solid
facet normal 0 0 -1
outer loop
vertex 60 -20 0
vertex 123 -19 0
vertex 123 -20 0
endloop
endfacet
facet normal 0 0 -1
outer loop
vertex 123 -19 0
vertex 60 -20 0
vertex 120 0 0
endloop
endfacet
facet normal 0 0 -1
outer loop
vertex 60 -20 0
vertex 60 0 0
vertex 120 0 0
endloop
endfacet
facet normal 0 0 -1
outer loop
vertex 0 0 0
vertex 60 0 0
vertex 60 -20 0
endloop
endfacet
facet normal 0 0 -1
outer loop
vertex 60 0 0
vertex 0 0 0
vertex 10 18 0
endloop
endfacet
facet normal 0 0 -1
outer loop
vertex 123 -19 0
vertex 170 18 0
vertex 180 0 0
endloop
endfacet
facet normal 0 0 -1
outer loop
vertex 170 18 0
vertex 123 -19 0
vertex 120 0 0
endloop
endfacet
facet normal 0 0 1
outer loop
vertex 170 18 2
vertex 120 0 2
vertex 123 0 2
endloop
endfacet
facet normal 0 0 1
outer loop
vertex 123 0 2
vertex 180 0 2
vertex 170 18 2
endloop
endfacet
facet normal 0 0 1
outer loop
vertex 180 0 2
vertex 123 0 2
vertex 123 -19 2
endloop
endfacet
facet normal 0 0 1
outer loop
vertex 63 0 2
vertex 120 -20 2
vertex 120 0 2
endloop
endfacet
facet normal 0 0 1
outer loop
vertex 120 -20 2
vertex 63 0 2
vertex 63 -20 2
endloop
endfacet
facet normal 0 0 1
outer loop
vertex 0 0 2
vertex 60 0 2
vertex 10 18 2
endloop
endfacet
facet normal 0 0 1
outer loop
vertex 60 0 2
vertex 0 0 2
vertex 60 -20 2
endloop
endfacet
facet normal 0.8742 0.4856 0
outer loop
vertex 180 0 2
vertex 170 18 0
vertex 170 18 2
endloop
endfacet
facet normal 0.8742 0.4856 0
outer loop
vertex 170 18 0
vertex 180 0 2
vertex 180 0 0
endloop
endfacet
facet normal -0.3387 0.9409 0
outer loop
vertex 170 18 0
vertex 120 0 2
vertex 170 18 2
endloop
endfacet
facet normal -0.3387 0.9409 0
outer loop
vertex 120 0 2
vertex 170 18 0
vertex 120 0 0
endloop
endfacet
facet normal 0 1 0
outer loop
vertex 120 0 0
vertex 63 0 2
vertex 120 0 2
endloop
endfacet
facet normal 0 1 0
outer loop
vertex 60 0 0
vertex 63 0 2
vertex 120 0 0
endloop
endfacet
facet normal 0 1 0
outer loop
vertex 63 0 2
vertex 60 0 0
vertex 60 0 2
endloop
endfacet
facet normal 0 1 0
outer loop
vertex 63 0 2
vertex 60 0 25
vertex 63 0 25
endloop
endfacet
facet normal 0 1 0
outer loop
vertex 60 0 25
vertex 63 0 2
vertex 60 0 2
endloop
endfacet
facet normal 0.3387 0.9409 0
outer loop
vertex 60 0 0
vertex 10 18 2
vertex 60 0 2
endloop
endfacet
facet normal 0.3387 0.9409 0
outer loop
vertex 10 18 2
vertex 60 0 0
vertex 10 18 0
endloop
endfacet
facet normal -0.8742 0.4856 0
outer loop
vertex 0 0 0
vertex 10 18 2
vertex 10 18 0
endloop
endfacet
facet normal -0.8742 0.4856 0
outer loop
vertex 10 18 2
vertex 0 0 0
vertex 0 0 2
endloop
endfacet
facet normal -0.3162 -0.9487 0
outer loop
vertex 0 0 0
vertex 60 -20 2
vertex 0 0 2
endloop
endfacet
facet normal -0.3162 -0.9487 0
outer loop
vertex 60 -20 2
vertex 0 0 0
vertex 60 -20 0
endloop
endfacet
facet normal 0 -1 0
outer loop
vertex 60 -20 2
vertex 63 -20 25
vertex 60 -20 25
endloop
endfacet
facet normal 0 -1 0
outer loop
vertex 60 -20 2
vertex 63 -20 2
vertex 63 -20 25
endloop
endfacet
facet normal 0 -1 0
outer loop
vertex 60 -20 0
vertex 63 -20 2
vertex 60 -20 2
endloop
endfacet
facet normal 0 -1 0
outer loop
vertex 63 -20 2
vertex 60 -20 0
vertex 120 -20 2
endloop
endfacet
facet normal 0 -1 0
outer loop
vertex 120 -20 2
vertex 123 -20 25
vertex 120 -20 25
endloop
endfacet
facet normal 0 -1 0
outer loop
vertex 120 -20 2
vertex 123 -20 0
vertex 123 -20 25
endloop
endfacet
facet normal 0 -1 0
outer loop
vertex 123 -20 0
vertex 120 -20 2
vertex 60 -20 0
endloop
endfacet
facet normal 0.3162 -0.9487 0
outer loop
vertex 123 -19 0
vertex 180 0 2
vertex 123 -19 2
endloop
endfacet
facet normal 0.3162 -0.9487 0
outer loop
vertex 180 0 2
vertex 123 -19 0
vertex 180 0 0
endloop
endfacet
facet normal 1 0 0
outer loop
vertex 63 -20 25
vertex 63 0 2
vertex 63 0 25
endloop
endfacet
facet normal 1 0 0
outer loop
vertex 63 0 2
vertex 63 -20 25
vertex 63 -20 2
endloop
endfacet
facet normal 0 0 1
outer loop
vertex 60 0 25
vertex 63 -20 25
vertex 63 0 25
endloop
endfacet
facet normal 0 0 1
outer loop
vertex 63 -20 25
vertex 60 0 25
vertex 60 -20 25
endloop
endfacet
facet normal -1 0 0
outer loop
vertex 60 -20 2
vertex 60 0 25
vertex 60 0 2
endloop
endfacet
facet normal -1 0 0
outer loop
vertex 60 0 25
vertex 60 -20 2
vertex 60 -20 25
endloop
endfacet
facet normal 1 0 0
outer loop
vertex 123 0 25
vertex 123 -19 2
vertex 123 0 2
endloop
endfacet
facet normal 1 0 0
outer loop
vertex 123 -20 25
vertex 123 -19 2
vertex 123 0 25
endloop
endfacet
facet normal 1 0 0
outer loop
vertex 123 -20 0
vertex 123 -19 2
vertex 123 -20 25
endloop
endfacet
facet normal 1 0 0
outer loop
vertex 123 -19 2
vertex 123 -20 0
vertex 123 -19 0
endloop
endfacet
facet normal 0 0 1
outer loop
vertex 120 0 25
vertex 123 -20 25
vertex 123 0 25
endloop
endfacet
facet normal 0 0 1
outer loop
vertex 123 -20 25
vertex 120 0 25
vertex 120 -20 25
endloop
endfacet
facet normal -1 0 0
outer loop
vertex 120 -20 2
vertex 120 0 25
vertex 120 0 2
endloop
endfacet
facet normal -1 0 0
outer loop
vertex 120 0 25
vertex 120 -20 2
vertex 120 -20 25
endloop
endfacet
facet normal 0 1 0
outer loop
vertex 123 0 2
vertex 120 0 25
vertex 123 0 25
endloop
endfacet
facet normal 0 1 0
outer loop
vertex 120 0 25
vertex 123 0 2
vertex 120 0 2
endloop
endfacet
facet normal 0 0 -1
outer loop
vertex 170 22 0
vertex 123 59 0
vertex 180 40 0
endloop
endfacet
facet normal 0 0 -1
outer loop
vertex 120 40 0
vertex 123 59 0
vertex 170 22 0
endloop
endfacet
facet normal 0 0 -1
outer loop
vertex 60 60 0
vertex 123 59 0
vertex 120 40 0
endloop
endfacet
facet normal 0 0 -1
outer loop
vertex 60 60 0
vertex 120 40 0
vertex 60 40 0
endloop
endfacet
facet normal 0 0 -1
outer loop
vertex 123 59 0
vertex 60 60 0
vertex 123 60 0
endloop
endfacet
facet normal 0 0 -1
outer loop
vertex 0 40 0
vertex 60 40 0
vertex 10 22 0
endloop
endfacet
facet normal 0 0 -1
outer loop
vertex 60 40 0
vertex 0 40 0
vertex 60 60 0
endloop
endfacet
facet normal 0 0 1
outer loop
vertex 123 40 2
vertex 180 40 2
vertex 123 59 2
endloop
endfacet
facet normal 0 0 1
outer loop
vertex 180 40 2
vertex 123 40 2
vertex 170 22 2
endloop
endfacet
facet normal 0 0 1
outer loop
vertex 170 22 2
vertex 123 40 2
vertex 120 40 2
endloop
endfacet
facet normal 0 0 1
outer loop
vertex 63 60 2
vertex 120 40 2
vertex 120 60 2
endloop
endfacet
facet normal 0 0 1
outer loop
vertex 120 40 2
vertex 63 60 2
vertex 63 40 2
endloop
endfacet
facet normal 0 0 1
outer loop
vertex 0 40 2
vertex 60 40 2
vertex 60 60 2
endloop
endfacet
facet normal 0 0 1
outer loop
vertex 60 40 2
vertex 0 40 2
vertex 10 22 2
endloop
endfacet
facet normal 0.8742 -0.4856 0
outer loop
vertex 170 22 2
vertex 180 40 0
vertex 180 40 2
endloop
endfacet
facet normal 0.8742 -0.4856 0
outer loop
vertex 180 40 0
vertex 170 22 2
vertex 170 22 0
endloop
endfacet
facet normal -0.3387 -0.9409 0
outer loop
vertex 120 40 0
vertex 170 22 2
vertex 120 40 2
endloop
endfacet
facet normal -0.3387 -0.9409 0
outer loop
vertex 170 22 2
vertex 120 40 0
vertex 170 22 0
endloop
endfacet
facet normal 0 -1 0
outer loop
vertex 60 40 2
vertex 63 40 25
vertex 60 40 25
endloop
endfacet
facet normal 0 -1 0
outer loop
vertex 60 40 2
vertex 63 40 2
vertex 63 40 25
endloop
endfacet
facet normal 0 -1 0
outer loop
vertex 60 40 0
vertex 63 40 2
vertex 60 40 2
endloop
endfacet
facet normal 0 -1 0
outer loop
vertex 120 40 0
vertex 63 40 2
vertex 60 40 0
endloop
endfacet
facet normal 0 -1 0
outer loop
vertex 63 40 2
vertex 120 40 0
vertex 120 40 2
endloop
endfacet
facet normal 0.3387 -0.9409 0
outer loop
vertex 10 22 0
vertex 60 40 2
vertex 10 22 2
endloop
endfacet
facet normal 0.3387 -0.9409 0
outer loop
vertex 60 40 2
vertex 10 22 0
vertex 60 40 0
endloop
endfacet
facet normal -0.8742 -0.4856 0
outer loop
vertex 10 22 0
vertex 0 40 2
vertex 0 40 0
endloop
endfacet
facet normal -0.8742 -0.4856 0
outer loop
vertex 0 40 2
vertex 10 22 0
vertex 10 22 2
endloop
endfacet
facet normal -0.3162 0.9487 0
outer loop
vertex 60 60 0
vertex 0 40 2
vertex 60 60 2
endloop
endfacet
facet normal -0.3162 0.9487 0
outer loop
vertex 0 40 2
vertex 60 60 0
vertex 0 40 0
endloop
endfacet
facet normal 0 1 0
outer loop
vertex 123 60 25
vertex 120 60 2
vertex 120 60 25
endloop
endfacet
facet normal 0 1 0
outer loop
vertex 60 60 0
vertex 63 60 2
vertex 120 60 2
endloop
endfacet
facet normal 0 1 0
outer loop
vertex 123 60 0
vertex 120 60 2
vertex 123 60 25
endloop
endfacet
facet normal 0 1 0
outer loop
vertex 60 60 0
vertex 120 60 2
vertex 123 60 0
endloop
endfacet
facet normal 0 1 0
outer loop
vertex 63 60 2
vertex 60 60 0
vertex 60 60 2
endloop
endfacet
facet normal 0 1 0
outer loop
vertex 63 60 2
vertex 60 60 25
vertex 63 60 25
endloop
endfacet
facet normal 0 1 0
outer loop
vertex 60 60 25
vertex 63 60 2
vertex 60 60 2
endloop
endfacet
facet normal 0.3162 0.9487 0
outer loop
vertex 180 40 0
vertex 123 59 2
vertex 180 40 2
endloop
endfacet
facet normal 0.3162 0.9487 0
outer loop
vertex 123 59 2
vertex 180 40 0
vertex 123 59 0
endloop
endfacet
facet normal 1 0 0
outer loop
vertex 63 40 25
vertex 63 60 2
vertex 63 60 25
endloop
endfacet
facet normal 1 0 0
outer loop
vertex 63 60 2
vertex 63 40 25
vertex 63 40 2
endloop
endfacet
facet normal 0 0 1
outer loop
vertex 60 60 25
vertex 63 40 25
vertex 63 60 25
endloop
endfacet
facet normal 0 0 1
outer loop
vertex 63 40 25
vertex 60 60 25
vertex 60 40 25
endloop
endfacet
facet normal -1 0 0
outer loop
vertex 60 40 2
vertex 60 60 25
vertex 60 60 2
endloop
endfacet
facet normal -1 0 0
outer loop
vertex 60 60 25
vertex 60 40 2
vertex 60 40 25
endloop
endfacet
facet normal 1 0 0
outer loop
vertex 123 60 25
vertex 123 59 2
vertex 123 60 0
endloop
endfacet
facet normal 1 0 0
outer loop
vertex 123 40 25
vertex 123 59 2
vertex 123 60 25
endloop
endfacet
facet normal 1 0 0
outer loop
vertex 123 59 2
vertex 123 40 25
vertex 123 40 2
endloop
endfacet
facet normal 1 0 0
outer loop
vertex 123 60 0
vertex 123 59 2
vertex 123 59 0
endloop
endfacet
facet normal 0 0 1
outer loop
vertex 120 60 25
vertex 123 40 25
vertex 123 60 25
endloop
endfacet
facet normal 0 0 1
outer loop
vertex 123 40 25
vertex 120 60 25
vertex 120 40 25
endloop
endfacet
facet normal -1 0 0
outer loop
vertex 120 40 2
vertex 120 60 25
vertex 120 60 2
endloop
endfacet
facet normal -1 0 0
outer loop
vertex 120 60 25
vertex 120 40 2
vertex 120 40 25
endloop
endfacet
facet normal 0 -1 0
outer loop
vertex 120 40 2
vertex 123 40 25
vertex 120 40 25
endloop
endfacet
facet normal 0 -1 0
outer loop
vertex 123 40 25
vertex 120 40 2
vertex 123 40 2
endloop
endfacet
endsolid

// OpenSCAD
//servo_with_2holders();
//leg_with_servo();
//servo_holder1();
//servo_holder1_1();
//servo_holder();

//2servo_holders_for_printing();
//2servo_holders1_for_printing();
//2servo_holders1_1_for_printing();
//2legs_for_printing();

//4servo_holders_for_printing();
//4servo_holders1_for_printing();

//scale(v=[.3,.3,.3]) full_model();
body();
translate([0,40,0]) mirror([0,1,0]) body();


module full_leg() {
    translate ([80, 0, 0]) rotate(a=180, v=[0,0,1]) {
        rotate(a=45, v=[0,1,0]) 2servo_holders_for_printing();
        translate([-20, 8, 50]) rotate(a=120, v=[0,1,0]) leg_with_servo();
        translate([0, 6, -25]) servo_with_holder1();
        translate([81, 12, -32]) rotate(a=90, v=[1,0,0]) rotate(a=180, v=[0,1,0]) servo_with_holder1();    
    }
}

module full_model() {
    module right_half() {
        translate([10,-50, -40]) rotate (a=90, v=[0,0,1]) body();
        translate([10,130, 0]) rotate (a=180, v=[0,1,0]) rotate (a=270, v=[0,0,1]) body();
        // 3 legs
        translate([-10, 0, 0]) rotate (a=-30, v=[0,0,1]) full_leg();
        translate([0, 60, 0]) full_leg(); 
        translate([-20, 120, 0]) rotate (a=30, v=[0,0,1]) full_leg();
    }

    right_half();
    translate([-60,0,0]) mirror([1,0,0]) right_half();
}

module 4servo_holders_for_printing() {
    2servo_holders_for_printing();
    translate ([0, 42, 0]) 2servo_holders_for_printing();
}

module 4servo_holders1_for_printing() {
    2servo_holders1_for_printing();
    translate ([0, 32, 0]) 2servo_holders1_for_printing();
}

module 2servo_holders_for_printing() {
    // 2 servo holders for printing
    translate ([0, 0, 14]) rotate(a=90, v=[0,1,0]) servo_holder();
    rotate(a=270, v=[0,1,0]) servo_holder();
}

module 2servo_holders1_for_printing() {
    // 2 servo holders for printing
    translate ([-42, 0, 0]) servo_holder1();
    servo_holder1();
}

module 2servo_holders1_1_for_printing() {
    // 2 servo holders for printing
    translate ([-42, 0, 0]) servo_holder1_1();
    servo_holder1_1();

    translate([-1, 0, 0]) cube([4, 0.5, 14]);
}

module 2legs_for_printing() {
    // 2 legs for printing
    translate ([0, 0, 3]) rotate (a= 90, v=[1,0,0]) leg();
    translate ([0, 4, 0]) rotate (a= 270, v=[1,0,0]) leg();

    cube([0.5, 4, 3]);
}


module leg_with_servo() {
    leg();

    translate ([24, 8, 12]) 
        rotate (a=180, v=[0, 1, 0]) 
        rotate (a=90, v=[1, 0, 0]) 9g_motor();
}

module body() {
    linear_extrude (height = 2)
        polygon(points=[[0,0], [60,-20], [120,-20],[180,0], 
                                   [170,18], [120,00], [60,0], [10,18]], 
                                  paths=[[0,1,2,3,4,5,6,7]]);
    
    //translate([75, -20, 0]) cube([30, 80, 2]);

    translate([60, -20, 0]) cube([3, 20, 25]);
    translate([120, -20, 0]) cube([3, 20, 25]);
}

module leg() {

    difference() {
        //minkowski($fn=20) {
            rotate (a= 90, v = [1, 0, 0]) linear_extrude (height = 3) {
                polygon(points=[[0,0],[0,20],[40,20],[148,30], [150,27],[40,0]], 
                             paths=[[0,1,2,3,4,5]]);
                translate([150, 30, 0]) circle(r = 3);
            }
            // rounded corners
            sphere(1);
        //}
        translate ([11, -5, 6]) cube ([23, 6, 16]);
    }
}

module servo_with_2holders() {
    servo_holder();
    translate ([15, 6, 4]) rotate (a=270, v=[0, 1, 0])  servo_with_holder1();
}

module servo_with_holder1() {
    translate ([20.5, 10, 8]) rotate (a=90, v=[1, 0, 0]) 9g_motor();
    servo_holder1();
//    servo_holder1_1();
}

module servo_holder1() {
    // дно
    cube ([41, 16+9, 2]);

    // боковина напротив держалок
    translate([9, 16+7, 0]) cube ([23, 2, 12 + 2]);
    
    // боковина перепендикулярно держалкам
    translate ([39, 7, 0]) cube ([2, 14, 12 + 2]);

    // держалки
    cube ([9, 4, 12 + 2]);
    translate([41-9, 0, 0]) cube ([9, 4, 12 + 2]);
}

module servo_holder1_1() {
    // дно
    cube ([41, 16+9, 2]);

    // боковина напротив держалок
    translate([9, 16+7, 0]) cube ([23, 2, 12 + 2]);
    
    // боковина перепендикулярно держалкам
    translate ([39, 7, 0]) cube ([2, 14, 12 + 2]);

    // держалки - сплошная плоскость - дырку для мотора можно выпилить
    cube ([41, 2, 12 + 2]);
}

module servo_holder() {
    union() {
        // дно
        cube ([14, 36, 2]);

        // повернуть скругленную доску на 90 градусов
        rotate (a=90, v=[1, 0, 0]) rounded_plane();
        // повернуть доску на 90 градусов и сдвинуть в бок
        translate ([0, 36, 0]) rotate (a=90, v=[1, 0, 0]) rounded_plane();
    }

    // скругленная плоскость - доска + цилиндр
    module rounded_plane() {
        union() {
            cube([14, 20 + 2 + 10, 2]);
            translate([7, 20 + 2 + 10, 0]) cylinder(h=2, r=7);
        }
    }
}

module 9g_motor(){
	difference(){			
		union(){
			cube([23,12.5,22], center=true);
			translate([0,0,5]) cube([32,12,2], center=true);
			translate([5.5,0,2.75]) cylinder(r=6, h=25.75, $fn=20, center=true);
			translate([-.5,0,2.75]) cylinder(r=1, h=25.75, $fn=20, center=true);
			translate([-1,0,2.75]) cube([5,5.6,24.5], center=true);		
			translate([5.5,0,3.65]) cylinder(r=2.35, h=29.25, $fn=20, center=true);				
		}
		translate([10,0,-11]) rotate([0,-30,0]) cube([8,13,4], center=true);
		for ( hole = [14,-14] ){
			translate([hole,0,5]) cylinder(r=2.2, h=4, $fn=20, center=true);
		}	
	}
}
